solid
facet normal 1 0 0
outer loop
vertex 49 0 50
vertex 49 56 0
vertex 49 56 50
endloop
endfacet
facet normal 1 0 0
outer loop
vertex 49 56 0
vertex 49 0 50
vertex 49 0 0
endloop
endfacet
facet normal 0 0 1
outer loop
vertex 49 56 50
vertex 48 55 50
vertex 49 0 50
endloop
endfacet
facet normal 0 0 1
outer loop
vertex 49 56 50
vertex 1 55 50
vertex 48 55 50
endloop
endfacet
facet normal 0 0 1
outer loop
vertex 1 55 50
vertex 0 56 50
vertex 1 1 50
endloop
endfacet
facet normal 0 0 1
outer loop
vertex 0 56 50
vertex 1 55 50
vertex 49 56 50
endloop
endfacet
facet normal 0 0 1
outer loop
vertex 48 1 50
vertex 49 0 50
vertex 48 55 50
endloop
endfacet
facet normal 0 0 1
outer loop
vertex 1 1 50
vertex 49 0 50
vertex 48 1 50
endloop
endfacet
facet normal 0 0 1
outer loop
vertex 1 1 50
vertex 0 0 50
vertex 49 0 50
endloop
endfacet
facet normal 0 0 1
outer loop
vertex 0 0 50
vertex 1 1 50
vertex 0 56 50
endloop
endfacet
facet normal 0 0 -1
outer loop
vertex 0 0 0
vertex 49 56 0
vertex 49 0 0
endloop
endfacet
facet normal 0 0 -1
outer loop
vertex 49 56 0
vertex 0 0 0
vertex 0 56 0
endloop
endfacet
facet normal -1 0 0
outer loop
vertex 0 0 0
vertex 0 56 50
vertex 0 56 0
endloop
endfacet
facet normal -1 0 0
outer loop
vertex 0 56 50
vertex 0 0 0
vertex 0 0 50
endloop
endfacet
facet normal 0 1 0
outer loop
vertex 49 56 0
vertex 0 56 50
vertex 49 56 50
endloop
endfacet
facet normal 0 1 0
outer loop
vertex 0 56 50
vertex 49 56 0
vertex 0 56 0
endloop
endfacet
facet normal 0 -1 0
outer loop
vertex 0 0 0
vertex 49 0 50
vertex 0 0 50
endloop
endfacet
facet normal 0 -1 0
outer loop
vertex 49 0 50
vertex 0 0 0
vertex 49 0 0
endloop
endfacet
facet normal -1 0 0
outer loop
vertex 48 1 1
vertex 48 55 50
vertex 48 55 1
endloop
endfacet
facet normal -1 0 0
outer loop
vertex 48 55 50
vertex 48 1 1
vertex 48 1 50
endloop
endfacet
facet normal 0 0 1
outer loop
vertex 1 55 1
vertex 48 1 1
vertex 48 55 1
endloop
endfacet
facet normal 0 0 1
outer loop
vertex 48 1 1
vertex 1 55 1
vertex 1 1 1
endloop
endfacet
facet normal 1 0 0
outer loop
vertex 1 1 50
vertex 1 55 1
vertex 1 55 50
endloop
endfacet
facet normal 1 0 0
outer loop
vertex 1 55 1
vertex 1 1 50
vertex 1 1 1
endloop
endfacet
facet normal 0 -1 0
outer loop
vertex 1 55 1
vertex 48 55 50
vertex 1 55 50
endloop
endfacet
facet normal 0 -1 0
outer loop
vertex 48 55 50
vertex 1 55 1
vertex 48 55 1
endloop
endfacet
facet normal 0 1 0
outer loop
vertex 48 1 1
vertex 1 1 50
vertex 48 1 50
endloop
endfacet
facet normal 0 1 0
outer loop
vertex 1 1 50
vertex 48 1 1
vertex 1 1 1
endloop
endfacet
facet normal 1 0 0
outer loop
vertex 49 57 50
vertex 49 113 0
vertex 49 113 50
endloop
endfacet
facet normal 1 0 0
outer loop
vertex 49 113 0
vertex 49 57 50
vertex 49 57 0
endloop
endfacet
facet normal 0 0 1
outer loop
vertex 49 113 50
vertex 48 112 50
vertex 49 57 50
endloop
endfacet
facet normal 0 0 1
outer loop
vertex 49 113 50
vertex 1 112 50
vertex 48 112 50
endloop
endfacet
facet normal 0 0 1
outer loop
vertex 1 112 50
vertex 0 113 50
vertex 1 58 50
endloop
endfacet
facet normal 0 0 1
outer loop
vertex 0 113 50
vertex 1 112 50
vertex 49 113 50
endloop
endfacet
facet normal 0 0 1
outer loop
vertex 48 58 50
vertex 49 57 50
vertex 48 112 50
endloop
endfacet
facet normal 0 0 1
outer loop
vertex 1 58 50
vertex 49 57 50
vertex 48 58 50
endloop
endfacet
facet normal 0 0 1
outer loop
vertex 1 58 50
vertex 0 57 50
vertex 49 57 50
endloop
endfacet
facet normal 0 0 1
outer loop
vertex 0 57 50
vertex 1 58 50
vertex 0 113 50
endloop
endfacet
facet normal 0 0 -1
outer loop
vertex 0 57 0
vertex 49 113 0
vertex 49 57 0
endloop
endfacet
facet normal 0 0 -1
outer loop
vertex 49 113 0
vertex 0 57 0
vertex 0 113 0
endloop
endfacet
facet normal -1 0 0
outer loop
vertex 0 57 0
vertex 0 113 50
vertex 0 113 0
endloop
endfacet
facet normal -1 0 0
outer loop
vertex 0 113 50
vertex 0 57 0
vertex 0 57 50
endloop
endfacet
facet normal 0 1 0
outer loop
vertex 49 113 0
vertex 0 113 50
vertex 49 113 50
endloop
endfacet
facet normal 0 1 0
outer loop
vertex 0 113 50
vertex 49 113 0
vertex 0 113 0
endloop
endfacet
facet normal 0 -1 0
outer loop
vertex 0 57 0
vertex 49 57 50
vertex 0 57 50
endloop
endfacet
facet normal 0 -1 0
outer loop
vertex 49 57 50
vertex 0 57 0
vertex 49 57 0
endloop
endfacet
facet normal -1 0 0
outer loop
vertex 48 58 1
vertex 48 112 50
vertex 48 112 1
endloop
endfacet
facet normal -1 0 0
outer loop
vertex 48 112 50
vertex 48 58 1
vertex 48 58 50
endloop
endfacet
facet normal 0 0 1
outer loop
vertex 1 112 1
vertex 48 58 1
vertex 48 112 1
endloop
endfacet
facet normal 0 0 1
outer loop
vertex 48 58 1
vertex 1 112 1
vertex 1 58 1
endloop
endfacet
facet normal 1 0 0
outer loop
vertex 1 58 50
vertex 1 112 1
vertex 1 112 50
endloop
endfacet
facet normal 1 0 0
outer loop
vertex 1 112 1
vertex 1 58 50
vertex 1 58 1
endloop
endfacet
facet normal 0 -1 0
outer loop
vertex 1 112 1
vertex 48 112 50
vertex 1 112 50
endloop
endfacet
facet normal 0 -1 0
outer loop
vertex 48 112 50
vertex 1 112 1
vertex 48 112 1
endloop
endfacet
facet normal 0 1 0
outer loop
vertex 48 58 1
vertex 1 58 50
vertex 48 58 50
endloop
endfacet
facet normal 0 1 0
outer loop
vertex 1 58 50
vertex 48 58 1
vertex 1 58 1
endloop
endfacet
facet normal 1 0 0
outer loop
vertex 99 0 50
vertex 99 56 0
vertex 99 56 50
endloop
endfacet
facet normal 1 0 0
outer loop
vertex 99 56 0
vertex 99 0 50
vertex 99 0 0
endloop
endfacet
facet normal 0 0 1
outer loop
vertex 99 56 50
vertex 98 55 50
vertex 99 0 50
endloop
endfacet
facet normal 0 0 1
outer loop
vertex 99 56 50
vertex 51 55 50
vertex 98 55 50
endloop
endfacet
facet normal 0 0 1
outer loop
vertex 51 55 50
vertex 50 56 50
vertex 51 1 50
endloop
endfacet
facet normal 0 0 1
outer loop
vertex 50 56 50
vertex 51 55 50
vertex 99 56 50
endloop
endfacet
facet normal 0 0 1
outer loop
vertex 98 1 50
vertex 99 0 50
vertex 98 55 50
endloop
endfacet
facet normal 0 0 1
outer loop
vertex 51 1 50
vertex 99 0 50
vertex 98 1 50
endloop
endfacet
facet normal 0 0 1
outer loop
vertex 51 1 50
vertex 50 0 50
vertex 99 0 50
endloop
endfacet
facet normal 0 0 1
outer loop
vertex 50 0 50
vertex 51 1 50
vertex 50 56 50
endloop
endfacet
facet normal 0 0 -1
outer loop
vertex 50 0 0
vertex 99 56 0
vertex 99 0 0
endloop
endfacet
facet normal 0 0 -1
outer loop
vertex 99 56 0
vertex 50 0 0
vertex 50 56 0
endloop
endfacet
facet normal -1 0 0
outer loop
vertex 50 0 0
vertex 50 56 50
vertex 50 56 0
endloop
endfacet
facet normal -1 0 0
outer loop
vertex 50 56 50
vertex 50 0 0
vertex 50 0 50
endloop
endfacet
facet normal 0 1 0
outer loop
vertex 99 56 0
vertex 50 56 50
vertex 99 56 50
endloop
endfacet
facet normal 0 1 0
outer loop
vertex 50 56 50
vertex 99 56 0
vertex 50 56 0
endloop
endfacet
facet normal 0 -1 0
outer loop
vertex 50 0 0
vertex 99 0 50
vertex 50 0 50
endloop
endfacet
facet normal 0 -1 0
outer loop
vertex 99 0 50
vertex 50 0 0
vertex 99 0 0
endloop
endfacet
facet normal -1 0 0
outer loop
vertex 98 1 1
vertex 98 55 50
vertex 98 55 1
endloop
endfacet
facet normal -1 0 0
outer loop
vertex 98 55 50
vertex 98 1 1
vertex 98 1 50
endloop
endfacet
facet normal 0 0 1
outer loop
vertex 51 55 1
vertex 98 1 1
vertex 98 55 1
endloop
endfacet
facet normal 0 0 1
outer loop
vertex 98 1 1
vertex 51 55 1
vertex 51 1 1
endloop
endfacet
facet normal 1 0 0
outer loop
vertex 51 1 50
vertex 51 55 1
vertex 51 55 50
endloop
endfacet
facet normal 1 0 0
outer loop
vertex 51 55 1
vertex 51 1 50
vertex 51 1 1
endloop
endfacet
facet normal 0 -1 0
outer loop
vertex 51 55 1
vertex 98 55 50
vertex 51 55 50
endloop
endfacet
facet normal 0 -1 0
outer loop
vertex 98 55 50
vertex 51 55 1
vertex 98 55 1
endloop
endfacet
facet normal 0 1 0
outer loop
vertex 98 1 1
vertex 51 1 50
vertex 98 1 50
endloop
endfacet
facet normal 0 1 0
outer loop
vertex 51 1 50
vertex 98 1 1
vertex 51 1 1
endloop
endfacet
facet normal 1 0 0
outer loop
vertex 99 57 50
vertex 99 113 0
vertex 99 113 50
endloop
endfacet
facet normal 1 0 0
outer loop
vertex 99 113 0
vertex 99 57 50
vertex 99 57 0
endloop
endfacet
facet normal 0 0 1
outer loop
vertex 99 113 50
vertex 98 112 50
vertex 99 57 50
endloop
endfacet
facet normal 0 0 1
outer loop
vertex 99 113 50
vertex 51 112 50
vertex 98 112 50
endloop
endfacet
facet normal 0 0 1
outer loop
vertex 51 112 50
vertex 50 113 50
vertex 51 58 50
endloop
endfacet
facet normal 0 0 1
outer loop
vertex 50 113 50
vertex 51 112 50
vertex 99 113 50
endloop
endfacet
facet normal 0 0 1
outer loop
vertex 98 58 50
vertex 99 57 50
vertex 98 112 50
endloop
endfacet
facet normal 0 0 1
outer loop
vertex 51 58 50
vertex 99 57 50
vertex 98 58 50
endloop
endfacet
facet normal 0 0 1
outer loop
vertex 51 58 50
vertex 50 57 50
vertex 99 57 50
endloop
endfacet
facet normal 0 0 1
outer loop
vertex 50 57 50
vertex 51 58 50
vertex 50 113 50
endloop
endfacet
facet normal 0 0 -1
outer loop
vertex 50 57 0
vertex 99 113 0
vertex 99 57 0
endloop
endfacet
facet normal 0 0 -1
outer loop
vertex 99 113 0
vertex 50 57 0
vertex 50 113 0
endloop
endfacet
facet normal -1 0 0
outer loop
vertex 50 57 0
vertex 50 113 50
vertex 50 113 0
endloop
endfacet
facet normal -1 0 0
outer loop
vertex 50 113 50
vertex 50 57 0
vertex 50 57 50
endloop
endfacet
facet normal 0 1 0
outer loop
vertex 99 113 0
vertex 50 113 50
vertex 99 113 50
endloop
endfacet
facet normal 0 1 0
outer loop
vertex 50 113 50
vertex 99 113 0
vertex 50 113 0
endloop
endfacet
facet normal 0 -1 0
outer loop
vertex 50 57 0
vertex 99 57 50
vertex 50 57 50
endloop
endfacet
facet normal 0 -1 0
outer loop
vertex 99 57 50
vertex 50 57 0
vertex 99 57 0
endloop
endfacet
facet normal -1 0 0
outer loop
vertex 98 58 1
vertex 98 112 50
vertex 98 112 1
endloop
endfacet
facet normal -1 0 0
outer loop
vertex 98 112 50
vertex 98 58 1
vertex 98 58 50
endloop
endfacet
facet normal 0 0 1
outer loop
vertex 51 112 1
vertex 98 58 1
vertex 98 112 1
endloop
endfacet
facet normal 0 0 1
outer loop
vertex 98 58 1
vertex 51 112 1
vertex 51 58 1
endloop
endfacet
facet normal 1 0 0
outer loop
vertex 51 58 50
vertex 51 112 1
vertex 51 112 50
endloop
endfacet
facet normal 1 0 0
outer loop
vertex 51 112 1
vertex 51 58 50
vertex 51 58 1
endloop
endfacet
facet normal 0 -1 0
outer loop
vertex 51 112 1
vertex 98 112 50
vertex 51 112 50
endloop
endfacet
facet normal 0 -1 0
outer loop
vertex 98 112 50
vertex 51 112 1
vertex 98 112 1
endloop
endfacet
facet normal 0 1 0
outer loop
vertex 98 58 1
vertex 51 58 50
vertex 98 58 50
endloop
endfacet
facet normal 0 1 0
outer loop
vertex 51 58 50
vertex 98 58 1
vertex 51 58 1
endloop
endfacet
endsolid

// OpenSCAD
for(i = [0:1]){
    for(j = [0:1]){
        translate([i*50,j*57,0])
        difference(){
        cube([49,56,50]);
        translate([1,1,1])
        cube([47,54,49]);
    }
}
}
